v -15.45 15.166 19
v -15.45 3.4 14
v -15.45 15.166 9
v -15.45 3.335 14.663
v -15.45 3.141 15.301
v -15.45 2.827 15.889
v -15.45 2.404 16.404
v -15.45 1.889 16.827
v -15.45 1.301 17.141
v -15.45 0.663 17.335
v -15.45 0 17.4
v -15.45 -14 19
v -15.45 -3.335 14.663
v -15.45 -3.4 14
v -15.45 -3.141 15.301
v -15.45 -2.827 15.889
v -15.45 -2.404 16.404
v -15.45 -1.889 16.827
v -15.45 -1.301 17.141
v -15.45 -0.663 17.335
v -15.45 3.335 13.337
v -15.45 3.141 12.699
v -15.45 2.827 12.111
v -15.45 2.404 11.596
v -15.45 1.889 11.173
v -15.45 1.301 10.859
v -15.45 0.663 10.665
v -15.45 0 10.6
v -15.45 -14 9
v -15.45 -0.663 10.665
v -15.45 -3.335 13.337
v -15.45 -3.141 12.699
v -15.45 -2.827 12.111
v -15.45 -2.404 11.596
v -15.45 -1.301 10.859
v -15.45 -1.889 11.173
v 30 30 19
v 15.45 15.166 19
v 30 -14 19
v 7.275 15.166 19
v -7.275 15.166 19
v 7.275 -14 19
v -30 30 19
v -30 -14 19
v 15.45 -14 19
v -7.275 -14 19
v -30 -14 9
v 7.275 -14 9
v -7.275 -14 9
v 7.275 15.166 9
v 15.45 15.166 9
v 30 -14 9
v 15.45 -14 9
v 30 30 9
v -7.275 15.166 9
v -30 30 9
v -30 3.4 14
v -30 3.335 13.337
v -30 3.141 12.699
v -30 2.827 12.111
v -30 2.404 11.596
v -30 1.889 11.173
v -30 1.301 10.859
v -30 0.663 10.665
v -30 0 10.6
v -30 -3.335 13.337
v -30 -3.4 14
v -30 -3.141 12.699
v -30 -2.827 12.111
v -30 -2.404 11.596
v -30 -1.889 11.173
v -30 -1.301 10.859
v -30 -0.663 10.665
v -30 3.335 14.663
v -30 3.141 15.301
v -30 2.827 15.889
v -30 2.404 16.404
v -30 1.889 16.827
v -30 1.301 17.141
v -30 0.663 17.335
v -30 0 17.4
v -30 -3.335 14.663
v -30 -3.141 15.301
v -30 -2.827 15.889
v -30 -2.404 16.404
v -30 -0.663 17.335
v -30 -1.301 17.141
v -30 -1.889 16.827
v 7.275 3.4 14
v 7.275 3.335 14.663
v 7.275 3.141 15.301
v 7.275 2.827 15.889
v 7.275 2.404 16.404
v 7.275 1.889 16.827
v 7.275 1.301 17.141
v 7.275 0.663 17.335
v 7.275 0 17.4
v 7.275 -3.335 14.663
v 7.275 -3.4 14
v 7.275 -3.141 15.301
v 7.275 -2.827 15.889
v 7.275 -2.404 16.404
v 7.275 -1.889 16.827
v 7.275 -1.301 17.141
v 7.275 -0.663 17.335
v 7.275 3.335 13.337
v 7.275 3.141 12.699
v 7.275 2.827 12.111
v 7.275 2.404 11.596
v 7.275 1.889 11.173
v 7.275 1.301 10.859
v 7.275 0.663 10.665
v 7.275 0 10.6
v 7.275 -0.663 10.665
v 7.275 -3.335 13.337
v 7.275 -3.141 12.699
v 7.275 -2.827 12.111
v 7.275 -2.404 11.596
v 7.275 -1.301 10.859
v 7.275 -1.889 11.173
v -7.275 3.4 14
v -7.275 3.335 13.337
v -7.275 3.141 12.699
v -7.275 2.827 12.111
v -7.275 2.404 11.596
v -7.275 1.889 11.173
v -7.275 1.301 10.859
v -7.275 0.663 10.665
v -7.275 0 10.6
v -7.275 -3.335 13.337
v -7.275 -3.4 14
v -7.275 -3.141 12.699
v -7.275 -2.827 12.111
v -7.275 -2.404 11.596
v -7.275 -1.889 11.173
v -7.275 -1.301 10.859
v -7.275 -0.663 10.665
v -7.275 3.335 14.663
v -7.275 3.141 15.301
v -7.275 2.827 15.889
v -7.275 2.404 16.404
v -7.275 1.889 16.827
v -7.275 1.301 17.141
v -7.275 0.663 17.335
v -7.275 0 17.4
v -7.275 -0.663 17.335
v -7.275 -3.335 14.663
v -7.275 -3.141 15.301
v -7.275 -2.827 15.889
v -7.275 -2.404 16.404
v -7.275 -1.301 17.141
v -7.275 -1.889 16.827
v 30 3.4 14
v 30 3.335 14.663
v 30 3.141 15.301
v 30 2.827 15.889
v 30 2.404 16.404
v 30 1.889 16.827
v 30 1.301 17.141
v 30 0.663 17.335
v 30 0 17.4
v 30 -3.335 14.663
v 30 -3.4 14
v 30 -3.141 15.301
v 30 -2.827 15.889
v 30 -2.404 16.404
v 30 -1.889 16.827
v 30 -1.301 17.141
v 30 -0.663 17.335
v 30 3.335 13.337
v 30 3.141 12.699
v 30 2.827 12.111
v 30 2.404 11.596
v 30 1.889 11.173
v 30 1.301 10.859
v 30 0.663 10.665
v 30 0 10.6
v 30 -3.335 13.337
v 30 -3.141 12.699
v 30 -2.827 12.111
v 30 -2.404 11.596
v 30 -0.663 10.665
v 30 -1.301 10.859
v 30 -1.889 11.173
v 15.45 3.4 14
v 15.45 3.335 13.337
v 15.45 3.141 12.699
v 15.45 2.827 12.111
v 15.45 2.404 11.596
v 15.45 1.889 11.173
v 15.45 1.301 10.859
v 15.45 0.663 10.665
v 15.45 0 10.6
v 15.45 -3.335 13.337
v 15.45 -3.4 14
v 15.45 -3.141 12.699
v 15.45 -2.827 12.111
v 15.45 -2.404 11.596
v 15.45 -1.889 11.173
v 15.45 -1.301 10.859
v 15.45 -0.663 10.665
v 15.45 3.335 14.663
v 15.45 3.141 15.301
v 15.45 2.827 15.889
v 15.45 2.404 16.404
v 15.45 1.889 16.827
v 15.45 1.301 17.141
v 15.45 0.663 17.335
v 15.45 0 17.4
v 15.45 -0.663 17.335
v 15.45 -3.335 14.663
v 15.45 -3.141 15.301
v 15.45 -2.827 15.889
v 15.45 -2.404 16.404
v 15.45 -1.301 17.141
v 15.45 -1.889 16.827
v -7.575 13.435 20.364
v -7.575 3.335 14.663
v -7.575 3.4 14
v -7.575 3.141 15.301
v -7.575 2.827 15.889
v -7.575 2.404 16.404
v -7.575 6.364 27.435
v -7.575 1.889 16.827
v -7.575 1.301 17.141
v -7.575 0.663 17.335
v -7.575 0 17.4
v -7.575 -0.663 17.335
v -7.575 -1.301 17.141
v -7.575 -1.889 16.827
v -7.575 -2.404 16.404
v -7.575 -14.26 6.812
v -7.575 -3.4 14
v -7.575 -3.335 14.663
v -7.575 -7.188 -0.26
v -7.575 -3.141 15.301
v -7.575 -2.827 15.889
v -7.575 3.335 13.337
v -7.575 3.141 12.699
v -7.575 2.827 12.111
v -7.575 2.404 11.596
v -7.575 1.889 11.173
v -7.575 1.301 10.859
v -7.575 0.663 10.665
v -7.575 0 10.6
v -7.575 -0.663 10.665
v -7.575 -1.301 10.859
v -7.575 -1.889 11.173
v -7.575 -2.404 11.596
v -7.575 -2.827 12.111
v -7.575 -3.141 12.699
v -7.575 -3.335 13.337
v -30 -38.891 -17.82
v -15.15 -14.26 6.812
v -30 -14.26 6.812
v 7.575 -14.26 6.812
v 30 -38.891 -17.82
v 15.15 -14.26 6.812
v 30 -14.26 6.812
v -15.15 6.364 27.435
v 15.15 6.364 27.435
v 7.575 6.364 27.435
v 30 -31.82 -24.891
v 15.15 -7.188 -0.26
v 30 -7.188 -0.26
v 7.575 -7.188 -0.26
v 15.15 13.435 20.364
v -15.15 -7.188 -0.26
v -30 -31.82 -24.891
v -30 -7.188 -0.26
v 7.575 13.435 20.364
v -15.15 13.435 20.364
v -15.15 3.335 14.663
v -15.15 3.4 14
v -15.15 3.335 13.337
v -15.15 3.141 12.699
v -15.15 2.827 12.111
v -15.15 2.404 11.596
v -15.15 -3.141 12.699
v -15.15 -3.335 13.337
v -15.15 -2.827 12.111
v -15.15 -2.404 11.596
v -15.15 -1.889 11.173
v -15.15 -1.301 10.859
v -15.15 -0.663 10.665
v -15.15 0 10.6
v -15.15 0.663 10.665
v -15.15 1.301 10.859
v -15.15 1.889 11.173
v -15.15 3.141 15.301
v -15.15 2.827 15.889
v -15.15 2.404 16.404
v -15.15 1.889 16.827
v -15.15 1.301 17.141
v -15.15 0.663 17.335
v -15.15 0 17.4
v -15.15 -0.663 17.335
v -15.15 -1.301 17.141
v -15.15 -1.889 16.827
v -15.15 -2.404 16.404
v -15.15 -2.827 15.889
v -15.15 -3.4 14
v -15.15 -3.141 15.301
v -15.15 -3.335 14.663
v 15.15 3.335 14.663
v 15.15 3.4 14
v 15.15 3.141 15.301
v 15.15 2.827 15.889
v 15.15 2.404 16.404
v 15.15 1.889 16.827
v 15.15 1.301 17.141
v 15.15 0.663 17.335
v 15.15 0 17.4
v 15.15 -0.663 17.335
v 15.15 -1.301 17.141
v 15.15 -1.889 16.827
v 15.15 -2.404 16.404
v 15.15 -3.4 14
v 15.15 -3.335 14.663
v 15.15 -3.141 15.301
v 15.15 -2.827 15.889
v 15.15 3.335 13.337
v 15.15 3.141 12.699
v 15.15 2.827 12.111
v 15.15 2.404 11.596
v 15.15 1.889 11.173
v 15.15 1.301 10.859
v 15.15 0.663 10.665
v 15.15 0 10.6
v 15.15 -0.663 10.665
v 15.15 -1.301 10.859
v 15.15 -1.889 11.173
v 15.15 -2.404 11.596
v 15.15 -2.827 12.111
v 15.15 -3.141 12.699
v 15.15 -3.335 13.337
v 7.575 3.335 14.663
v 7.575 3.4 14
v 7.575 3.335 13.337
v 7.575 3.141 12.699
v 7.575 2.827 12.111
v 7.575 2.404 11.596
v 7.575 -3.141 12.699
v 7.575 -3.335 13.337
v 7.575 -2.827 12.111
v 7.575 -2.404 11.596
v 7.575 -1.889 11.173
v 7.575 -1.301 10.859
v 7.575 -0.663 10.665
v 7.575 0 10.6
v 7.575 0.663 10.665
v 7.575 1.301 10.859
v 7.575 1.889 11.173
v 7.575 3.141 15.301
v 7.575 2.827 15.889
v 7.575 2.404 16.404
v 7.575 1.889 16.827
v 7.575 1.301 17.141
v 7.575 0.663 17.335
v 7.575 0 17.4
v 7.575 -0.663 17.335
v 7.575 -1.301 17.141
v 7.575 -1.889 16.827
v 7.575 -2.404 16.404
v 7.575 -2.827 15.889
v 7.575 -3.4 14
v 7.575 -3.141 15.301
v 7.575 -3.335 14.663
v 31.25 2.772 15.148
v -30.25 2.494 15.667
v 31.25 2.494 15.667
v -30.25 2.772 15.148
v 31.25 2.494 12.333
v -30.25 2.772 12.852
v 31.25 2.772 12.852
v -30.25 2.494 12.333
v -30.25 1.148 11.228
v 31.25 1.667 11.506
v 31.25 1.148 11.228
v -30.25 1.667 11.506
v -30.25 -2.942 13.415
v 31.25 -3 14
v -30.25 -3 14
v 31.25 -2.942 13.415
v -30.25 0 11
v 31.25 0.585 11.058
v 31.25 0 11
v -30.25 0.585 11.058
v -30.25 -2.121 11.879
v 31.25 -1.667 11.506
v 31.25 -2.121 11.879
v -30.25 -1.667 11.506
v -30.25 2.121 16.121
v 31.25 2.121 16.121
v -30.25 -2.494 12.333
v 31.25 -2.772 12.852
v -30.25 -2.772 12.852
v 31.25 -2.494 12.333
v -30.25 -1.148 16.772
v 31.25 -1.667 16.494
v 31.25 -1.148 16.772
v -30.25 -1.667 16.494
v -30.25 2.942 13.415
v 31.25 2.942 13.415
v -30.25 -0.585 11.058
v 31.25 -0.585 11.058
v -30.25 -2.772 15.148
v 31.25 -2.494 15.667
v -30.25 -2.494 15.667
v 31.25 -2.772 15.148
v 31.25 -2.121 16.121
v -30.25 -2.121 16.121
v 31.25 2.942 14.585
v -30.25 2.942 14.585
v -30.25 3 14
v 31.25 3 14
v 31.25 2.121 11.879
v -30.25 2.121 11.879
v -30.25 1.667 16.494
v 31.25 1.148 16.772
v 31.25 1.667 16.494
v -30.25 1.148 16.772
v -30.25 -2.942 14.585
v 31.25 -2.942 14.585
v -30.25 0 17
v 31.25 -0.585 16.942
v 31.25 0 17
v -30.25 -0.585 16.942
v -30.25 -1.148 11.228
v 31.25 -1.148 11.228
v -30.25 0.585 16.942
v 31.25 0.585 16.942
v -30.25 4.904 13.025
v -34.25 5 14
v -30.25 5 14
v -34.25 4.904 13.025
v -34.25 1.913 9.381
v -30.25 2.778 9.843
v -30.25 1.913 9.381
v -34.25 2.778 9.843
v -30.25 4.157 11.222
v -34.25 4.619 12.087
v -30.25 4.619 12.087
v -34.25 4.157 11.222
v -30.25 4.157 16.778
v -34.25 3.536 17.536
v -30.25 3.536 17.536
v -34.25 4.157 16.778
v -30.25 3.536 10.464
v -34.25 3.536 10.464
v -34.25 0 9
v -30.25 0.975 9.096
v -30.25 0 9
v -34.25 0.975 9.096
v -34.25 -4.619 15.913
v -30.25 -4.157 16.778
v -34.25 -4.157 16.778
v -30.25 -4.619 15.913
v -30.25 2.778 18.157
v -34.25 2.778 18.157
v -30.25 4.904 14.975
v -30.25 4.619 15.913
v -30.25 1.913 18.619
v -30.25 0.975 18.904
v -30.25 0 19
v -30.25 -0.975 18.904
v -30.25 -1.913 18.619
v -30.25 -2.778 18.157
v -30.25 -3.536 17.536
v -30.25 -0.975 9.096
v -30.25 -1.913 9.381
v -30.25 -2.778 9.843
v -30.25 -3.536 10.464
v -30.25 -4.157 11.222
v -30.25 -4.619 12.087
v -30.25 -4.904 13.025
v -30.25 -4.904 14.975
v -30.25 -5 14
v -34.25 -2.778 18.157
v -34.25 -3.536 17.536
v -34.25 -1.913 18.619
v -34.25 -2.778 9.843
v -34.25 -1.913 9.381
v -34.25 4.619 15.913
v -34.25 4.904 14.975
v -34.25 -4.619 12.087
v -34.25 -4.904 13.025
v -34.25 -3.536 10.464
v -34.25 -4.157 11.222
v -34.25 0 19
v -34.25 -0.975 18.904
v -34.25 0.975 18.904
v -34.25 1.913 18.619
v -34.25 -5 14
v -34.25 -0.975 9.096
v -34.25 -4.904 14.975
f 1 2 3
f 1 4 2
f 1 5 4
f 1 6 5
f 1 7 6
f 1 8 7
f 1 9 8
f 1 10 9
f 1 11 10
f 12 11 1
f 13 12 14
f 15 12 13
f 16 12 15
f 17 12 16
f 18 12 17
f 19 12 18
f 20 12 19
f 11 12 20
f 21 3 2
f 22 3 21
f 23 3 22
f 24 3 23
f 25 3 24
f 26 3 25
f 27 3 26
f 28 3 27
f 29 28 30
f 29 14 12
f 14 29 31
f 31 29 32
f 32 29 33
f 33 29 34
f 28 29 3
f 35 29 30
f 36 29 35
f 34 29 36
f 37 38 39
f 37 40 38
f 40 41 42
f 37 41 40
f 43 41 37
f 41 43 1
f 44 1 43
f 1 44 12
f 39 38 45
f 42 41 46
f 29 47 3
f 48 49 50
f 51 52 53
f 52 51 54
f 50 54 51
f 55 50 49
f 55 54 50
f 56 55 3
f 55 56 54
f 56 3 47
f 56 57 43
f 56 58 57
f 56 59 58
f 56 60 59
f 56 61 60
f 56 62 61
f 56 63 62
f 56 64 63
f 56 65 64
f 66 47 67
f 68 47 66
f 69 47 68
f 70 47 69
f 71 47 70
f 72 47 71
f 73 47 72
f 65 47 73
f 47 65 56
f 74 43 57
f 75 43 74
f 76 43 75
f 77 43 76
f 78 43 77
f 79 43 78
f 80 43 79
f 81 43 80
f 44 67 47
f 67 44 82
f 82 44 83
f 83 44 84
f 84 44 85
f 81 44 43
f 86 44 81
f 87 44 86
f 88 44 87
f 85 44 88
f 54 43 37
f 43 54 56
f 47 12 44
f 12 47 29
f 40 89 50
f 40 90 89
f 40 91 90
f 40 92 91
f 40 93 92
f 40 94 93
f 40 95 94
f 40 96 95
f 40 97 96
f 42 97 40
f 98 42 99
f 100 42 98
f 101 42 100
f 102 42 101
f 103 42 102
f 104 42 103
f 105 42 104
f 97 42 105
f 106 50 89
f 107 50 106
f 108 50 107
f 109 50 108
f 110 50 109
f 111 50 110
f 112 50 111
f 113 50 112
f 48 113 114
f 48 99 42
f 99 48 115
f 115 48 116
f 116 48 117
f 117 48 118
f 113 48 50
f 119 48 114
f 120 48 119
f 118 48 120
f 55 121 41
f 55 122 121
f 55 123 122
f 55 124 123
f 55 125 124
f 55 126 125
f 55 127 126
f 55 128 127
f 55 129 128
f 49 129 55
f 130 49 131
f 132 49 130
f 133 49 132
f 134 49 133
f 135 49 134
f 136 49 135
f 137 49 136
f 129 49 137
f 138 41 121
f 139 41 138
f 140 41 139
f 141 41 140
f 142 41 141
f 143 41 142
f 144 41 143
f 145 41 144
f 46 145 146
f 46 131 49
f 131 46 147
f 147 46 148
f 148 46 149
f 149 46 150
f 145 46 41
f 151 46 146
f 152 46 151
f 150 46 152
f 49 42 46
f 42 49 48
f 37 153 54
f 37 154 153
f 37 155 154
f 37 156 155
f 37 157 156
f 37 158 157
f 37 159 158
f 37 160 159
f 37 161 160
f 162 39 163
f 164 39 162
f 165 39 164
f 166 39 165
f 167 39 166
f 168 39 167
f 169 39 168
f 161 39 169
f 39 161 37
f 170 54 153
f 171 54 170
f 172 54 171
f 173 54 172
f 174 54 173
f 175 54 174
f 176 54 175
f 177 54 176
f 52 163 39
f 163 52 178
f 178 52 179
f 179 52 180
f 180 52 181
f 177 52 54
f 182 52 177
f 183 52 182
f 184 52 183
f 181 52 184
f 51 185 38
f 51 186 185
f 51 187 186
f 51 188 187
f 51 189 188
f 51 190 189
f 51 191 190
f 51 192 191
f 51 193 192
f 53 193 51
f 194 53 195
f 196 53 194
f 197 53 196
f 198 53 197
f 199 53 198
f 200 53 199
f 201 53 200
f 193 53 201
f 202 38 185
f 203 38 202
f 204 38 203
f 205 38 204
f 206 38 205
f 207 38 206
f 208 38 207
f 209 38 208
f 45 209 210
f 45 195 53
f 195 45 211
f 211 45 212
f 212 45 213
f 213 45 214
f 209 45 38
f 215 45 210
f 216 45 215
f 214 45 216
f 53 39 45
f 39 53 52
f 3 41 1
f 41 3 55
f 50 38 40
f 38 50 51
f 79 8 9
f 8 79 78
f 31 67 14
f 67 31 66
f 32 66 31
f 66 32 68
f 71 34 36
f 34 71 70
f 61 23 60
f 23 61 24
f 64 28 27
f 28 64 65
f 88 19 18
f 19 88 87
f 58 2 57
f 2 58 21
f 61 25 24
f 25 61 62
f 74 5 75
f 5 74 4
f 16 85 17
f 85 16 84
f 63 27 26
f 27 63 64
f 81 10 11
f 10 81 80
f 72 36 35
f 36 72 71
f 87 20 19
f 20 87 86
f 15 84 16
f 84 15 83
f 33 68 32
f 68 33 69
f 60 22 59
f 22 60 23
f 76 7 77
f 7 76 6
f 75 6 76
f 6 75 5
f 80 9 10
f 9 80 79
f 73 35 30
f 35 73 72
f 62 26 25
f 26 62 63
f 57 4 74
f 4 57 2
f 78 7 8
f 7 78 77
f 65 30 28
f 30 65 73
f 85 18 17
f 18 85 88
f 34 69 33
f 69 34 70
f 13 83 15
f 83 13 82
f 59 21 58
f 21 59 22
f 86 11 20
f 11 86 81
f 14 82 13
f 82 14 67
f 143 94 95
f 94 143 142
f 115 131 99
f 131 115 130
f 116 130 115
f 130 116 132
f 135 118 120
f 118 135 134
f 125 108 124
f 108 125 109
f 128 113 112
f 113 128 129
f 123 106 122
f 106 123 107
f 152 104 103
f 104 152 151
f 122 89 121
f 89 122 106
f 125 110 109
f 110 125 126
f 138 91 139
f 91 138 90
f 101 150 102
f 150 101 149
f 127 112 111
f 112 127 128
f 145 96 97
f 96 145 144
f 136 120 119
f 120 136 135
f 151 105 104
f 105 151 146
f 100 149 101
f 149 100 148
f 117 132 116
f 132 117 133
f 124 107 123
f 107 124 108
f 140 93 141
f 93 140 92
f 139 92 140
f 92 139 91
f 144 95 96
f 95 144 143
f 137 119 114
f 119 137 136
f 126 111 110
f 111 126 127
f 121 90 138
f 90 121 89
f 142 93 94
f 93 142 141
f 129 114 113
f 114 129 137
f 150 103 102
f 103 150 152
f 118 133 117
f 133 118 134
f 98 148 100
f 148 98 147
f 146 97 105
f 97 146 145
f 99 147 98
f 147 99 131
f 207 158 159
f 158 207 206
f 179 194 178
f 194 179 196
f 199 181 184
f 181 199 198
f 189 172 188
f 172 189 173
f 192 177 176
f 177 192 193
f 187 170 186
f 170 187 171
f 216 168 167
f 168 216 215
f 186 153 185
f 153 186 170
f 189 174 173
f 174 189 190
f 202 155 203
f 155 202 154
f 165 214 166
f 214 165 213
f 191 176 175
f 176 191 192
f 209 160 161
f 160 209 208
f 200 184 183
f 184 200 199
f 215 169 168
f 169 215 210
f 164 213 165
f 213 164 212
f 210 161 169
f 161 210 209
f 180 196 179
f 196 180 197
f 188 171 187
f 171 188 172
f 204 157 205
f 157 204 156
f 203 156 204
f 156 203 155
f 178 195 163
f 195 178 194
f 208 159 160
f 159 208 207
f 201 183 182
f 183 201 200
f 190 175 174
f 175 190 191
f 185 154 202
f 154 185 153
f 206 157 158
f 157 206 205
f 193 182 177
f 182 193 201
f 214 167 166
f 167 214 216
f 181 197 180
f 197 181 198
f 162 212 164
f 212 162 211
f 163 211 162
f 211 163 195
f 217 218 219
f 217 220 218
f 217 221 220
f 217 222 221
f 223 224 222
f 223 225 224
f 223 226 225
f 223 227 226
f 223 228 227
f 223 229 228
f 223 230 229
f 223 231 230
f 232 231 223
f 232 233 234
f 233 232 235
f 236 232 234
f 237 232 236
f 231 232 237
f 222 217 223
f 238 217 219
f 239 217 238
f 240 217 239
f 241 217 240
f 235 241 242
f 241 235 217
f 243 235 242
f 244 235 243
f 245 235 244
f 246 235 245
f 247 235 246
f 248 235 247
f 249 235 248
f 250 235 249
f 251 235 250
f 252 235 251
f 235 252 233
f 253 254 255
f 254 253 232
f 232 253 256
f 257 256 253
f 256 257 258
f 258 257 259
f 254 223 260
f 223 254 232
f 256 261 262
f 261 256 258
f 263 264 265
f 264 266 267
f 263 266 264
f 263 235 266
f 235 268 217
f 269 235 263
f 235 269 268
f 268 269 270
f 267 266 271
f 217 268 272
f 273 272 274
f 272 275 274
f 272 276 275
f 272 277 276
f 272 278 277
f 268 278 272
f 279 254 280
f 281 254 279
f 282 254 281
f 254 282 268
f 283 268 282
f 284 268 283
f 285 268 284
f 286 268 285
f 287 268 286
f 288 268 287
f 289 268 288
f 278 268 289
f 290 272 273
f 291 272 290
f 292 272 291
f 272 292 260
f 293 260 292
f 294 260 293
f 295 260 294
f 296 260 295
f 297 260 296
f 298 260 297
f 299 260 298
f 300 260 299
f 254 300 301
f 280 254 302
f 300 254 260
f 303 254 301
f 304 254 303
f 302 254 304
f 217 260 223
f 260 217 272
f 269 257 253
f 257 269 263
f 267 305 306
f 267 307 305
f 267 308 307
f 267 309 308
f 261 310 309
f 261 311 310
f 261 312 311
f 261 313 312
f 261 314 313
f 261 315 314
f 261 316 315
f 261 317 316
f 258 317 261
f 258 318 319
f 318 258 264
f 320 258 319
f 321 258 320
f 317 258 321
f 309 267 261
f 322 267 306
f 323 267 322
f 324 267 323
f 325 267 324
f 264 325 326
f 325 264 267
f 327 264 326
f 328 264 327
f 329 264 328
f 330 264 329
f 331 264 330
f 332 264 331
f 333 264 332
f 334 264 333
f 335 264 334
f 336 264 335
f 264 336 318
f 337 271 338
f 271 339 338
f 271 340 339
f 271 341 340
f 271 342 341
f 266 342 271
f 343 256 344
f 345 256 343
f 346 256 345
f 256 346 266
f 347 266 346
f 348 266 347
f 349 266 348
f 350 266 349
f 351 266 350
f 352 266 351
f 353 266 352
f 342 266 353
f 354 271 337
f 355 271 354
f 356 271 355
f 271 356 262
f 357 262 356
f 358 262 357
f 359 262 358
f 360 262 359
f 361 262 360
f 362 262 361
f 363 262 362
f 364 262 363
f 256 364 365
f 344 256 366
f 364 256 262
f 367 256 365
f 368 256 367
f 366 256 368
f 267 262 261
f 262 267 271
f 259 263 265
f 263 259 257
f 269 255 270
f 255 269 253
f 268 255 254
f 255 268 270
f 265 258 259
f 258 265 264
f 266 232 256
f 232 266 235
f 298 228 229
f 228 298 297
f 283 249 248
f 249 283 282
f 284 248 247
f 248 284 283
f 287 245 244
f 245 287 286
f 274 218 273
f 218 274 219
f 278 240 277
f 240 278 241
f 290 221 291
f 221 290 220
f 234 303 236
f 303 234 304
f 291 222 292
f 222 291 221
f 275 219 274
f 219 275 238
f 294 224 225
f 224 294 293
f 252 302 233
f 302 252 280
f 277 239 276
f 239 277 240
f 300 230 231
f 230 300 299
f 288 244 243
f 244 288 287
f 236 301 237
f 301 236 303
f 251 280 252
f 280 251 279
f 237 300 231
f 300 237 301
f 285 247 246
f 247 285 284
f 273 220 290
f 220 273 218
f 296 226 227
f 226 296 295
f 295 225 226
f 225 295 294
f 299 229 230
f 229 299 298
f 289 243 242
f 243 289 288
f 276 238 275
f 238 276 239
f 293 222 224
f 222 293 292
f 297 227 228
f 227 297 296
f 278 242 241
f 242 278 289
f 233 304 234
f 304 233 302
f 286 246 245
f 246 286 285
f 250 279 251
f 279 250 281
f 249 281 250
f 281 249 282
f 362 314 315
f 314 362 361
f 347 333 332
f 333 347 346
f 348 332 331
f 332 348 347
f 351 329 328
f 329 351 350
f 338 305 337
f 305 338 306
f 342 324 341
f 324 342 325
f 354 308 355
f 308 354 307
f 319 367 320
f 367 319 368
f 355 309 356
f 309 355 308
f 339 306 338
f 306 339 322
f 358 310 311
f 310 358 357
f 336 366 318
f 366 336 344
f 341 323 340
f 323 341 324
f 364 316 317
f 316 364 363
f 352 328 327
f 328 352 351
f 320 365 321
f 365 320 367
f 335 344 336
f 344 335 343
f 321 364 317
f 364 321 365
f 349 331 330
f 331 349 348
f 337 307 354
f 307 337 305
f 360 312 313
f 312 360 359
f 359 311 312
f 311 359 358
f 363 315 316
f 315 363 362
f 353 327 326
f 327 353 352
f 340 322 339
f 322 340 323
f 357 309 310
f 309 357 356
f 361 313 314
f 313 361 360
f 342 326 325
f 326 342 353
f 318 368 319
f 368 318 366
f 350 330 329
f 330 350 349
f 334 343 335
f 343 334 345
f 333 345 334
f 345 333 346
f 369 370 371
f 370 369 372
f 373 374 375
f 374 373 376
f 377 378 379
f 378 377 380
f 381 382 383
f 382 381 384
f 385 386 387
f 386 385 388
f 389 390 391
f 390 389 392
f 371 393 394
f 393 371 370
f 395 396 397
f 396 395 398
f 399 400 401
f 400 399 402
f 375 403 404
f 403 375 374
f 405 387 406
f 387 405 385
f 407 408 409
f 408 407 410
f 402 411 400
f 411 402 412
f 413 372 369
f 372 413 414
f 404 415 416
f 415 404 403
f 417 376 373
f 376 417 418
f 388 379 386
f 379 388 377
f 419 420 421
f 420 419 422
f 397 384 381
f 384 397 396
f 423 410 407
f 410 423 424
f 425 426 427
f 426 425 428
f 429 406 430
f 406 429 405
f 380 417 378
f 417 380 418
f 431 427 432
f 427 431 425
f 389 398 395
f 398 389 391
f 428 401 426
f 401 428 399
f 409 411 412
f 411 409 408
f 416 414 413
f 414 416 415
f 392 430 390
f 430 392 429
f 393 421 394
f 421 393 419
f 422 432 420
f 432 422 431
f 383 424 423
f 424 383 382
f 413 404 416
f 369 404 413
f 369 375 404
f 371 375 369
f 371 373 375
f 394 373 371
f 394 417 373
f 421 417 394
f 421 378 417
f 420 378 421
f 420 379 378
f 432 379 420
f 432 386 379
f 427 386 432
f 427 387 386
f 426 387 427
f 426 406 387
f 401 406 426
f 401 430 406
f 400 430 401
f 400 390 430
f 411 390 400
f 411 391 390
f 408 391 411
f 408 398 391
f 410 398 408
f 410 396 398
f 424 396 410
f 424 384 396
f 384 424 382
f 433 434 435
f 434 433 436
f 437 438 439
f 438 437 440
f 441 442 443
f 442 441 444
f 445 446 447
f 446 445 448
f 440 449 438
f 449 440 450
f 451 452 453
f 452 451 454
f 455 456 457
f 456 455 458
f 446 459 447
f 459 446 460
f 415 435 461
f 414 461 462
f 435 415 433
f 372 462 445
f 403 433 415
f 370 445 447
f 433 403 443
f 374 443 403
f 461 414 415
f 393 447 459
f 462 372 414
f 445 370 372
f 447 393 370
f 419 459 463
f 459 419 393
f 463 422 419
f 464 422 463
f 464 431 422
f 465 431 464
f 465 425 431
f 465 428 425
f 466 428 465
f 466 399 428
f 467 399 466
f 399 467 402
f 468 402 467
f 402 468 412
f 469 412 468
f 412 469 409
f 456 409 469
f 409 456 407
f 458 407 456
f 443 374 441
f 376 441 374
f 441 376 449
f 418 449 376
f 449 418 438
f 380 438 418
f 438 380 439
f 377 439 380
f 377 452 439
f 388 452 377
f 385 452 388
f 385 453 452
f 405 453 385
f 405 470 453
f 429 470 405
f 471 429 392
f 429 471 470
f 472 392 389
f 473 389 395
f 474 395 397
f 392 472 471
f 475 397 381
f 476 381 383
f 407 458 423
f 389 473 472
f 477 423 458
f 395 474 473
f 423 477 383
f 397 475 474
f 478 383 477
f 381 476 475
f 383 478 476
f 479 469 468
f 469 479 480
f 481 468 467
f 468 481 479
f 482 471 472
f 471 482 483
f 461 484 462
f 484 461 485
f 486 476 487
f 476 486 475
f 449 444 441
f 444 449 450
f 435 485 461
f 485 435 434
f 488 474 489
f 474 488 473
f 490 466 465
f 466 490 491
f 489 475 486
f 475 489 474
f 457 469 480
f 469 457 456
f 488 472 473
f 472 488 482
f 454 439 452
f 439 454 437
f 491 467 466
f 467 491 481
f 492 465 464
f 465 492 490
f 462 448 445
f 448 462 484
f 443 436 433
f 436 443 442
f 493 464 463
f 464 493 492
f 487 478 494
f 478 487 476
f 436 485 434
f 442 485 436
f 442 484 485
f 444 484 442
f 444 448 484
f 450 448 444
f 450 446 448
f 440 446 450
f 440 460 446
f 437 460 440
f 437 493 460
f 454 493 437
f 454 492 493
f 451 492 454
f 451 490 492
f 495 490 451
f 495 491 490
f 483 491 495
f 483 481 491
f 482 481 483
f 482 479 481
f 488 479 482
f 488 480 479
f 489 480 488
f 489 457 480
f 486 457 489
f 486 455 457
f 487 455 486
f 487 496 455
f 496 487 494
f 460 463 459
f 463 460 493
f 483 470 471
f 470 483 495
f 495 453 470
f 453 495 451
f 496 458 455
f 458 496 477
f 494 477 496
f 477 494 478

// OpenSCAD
$fn = 32;

// ------------------------------------------------------------------------
// Butt hinge: hinge 60 mm, leaf swung 45 deg
// Every part is its own module, assembly() places every instance.
// ------------------------------------------------------------------------

// --- part 1 ---
module hinge_base() {
  difference() {
    union() {
      translate([-30, -14, -5]) cube([14.55, 44, 10]);
      translate([-7.275, -14, -5]) cube([14.55, 44, 10]);
      translate([15.45, -14, -5]) cube([14.55, 44, 10]);
      translate([-30, 15.166, -5]) cube([60, 14.834, 10]);
    }
    translate([-22.725, 0, 0]) rotate([0, 90, 0]) cylinder(h = 16.55, d = 6.8, center = true);
    translate([0, 0, 0]) rotate([0, 90, 0]) cylinder(h = 16.55, d = 6.8, center = true);
    translate([22.725, 0, 0]) rotate([0, 90, 0]) cylinder(h = 16.55, d = 6.8, center = true);
  }
}

// --- part 2 ---
module hinge_mover() {
  difference() {
    union() {
      translate([-15.15, -50, -5]) cube([7.575, 64, 10]);
      translate([7.575, -50, -5]) cube([7.575, 64, 10]);
      translate([-30, -50, -5]) cube([60, 34.834, 10]);
    }
    translate([-11.362, 0, 0]) rotate([0, 90, 0]) cylinder(h = 9.575, d = 6.8, center = true);
    translate([11.362, 0, 0]) rotate([0, 90, 0]) cylinder(h = 9.575, d = 6.8, center = true);
  }
}

// --- part 3 ---
module hinge_pin() {
  rotate([0, 90, 0]) cylinder(h = 62.5, d = 6, center = true);
  translate([-34.25, 0, 0]) rotate([0, 90, 0]) cylinder(h = 4, d = 10);
}

// --- assembly ---
module assembly() {
  color([0.80, 0.24, 0.20]) translate([0, 0, 14]) rotate([0, 0, 0]) hinge_base();
  color([0.20, 0.45, 0.75]) translate([0, 0, 14]) rotate([45, 0, 0]) hinge_mover();
  color([0.25, 0.62, 0.32]) translate([0, 0, 14]) rotate([0, 0, 0]) hinge_pin();
}

assembly();
